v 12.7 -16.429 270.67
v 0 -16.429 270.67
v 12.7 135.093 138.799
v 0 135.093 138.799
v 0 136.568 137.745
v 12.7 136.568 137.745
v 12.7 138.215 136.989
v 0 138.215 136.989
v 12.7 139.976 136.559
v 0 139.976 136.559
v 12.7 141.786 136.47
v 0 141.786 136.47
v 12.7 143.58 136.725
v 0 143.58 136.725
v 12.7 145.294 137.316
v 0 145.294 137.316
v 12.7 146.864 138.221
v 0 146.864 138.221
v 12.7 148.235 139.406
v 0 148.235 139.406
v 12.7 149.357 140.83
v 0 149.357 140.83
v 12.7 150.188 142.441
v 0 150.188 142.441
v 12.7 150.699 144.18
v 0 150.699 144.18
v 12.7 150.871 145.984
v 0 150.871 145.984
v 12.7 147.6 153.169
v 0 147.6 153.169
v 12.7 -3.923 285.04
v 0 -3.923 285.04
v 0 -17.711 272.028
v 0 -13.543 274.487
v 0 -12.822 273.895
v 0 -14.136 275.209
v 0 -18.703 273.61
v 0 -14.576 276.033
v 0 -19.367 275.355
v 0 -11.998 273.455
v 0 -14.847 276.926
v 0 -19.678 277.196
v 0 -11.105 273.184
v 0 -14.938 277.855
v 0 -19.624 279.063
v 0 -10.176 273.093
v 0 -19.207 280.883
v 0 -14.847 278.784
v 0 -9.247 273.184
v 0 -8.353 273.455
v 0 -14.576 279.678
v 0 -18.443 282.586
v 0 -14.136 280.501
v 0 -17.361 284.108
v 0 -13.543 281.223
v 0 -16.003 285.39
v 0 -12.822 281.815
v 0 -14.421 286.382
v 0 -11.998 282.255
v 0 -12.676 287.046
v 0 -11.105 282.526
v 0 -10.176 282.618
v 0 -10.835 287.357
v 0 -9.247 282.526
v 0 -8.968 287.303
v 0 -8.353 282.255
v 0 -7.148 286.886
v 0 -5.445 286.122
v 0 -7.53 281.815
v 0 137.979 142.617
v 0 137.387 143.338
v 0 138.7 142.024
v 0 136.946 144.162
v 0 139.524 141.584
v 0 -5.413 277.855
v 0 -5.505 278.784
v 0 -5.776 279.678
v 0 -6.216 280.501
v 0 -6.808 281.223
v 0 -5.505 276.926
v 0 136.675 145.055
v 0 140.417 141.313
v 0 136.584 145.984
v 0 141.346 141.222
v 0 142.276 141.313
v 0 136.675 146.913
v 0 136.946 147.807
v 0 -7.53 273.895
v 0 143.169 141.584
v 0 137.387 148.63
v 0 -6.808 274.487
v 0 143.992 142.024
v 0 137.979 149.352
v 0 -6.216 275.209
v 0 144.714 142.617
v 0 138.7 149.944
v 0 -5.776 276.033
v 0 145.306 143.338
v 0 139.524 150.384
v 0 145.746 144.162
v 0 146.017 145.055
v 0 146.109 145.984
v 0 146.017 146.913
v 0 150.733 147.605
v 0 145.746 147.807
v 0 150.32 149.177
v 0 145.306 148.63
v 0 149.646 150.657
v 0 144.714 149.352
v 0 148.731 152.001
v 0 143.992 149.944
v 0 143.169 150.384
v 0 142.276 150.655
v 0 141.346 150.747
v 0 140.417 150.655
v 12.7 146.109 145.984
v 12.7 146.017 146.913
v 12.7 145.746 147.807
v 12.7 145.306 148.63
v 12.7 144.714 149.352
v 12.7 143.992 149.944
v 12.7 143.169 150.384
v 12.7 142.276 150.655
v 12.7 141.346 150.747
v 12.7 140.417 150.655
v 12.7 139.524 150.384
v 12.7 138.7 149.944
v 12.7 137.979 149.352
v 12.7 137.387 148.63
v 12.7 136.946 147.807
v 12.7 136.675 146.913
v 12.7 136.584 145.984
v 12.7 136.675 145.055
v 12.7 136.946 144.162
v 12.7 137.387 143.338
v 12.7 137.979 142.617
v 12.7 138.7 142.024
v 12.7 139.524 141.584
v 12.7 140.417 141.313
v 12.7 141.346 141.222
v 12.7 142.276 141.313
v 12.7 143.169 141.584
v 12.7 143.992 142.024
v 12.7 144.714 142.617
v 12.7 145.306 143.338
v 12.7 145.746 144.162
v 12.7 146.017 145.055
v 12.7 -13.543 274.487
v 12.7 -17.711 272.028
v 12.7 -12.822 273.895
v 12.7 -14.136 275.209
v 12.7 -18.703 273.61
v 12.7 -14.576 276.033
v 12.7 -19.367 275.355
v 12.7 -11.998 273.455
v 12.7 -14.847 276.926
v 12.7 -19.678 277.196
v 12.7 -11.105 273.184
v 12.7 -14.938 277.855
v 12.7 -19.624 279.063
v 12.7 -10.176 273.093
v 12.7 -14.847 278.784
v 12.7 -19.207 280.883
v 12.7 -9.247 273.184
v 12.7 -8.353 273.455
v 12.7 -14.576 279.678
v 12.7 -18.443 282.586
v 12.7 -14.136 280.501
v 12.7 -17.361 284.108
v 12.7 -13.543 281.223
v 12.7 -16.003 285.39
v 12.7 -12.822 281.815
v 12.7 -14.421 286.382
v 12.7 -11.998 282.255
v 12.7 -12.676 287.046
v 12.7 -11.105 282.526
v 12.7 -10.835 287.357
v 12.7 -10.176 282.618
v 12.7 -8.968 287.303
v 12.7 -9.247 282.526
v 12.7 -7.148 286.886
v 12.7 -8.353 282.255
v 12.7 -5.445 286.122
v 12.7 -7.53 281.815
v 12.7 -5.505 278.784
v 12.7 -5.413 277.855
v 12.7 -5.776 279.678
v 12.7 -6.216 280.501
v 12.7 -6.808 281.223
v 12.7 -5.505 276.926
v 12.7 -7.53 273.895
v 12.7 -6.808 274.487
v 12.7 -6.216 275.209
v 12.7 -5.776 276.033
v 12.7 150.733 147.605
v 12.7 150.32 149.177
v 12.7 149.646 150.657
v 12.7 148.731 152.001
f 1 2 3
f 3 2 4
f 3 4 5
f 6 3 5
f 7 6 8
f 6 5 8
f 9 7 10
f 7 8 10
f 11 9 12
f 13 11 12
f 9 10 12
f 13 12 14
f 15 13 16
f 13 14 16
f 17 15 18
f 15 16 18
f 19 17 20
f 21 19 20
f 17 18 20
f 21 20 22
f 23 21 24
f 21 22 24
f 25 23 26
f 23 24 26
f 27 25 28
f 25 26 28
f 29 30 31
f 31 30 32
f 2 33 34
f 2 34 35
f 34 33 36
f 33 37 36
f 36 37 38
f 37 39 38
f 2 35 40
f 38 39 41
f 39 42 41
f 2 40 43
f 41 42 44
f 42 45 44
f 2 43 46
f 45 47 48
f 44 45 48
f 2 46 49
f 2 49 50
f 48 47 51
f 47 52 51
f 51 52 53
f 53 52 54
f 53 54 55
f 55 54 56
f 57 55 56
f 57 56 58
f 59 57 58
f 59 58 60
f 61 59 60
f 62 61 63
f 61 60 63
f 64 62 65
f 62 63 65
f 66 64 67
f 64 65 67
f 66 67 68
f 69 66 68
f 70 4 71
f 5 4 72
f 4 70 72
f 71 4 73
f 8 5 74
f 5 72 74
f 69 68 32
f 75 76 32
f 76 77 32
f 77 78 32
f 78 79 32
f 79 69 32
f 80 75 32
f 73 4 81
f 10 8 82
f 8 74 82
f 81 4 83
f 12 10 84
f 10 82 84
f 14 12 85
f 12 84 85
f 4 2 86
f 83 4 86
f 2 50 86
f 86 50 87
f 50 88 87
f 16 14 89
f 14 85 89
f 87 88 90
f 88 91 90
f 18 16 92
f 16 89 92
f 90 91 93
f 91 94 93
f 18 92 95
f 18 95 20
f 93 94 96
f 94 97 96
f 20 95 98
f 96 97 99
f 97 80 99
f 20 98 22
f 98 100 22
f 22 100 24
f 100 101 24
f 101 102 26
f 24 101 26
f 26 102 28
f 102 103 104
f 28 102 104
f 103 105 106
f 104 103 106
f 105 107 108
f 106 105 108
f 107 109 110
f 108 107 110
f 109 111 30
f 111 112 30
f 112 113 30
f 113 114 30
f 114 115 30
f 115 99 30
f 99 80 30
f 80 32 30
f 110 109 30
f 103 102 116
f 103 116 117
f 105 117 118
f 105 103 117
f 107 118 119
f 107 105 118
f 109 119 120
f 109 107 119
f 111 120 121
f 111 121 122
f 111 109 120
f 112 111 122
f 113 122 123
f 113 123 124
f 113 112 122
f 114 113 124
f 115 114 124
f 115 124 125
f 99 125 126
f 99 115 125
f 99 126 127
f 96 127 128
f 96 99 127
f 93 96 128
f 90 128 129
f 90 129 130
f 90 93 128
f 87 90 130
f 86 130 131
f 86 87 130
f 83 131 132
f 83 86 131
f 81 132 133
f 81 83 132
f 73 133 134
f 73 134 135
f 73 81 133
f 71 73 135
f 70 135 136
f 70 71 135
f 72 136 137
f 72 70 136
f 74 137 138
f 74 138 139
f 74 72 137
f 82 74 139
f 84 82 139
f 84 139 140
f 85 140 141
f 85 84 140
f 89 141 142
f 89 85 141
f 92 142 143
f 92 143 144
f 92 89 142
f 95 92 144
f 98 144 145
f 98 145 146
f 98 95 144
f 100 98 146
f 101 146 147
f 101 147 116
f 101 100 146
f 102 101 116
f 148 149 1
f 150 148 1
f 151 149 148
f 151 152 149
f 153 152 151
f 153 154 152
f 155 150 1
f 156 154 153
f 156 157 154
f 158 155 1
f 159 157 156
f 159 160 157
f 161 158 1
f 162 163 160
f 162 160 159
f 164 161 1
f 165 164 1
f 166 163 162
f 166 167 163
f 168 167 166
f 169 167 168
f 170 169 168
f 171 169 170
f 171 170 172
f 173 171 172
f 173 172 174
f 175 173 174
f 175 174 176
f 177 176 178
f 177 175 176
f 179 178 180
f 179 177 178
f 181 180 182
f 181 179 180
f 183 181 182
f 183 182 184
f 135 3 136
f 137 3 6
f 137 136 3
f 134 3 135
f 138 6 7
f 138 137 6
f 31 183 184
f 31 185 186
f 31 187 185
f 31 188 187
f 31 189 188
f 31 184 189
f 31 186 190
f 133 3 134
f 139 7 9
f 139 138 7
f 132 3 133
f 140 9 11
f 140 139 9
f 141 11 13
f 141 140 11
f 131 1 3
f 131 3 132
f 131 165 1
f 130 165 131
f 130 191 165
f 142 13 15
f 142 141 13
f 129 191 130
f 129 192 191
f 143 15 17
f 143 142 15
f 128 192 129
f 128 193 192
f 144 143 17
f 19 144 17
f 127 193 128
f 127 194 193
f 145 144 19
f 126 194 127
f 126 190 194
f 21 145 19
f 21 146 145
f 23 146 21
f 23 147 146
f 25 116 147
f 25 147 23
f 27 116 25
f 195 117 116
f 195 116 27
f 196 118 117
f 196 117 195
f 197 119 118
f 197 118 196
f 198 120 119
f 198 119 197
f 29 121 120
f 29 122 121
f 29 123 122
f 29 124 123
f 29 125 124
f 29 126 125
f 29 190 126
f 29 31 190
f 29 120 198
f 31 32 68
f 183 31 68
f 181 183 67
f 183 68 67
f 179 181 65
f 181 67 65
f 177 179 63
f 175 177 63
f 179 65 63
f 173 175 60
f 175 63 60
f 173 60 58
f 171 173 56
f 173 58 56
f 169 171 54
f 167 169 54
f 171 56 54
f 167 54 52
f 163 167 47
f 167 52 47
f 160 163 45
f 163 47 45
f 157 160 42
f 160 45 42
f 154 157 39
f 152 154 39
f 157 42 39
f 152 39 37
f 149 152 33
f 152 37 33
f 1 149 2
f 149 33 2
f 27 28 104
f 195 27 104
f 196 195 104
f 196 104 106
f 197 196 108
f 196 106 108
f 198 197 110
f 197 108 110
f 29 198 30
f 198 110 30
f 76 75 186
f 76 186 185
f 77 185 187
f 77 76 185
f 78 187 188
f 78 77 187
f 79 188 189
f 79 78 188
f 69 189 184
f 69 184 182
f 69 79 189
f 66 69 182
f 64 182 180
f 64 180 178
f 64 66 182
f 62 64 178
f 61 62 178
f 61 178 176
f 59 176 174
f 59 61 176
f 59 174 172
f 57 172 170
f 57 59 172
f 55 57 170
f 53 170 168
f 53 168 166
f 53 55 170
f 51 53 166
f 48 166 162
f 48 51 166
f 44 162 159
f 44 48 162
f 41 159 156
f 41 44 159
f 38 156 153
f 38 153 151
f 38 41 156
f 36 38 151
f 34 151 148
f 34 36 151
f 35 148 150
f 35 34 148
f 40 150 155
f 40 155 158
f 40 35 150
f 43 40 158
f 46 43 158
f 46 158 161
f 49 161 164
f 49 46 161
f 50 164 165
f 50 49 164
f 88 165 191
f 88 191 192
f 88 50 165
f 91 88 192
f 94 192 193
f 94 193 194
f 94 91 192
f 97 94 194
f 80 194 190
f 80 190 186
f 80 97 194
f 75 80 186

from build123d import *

# Parameters (mm, degrees)
F0_R     = 4.7625
F1_DEPTH = 12.7


# Not quite as in the source:
# - a feature names something its author has since deleted; it is built from what else it names


with BuildPart() as f1:
    # F0 (on Right) → F1 (new body)
    with BuildSketch(Plane.YZ):
        with BuildLine():
            ThreePointArc((135.0932664818, 138.7993858615), (134.1614165409, 152.23749978), (147.5995304594, 153.1693497209))
            Line((147.5995304594, 153.1693497209), (-3.9226998699, 285.0400370456))
            ThreePointArc((-3.9226998699, 285.0400370456), (-1.5073052482, 281.8024937035), (-0.6508318587, 277.8550551158))
            ThreePointArc((-0.6508318587, 277.8550551158), (-6.2283932711, 269.1865285054), (-16.4289638475, 270.6700731861))
            Line((-16.4289638475, 270.6700731861), (135.0932664818, 138.7993858615))
        make_face()
        with BuildLine():
            ThreePointArc((-0.6508318587, 277.8550551158), (-1.5073052482, 281.8024937035), (-3.9226998699, 285.0400370456))
            ThreePointArc((-3.9226998699, 285.0400370456), (-17.3608137885, 284.1081871047), (-16.4289638475, 270.6700731861))
            ThreePointArc((-16.4289638475, 270.6700731861), (-6.2283932711, 269.1865285054), (-0.6508318587, 277.8550551158))
        make_face()
        with Locations((-10.1758318587, 277.8550551158)):
            Circle(F0_R, mode=Mode.SUBTRACT)
        with BuildLine():
            ThreePointArc((135.0932664818, 138.7993858615), (145.2938370582, 137.3158411807), (150.8713984706, 145.9843677912))
            ThreePointArc((150.8713984706, 145.9843677912), (150.0149250811, 149.9318063789), (147.5995304594, 153.1693497209))
            ThreePointArc((147.5995304594, 153.1693497209), (134.1614165409, 152.23749978), (135.0932664818, 138.7993858615))
        make_face()
        with Locations((141.3463984706, 145.9843677912)):
            Circle(F0_R, mode=Mode.SUBTRACT)
    extrude(amount=F1_DEPTH)


solid = f1.part
